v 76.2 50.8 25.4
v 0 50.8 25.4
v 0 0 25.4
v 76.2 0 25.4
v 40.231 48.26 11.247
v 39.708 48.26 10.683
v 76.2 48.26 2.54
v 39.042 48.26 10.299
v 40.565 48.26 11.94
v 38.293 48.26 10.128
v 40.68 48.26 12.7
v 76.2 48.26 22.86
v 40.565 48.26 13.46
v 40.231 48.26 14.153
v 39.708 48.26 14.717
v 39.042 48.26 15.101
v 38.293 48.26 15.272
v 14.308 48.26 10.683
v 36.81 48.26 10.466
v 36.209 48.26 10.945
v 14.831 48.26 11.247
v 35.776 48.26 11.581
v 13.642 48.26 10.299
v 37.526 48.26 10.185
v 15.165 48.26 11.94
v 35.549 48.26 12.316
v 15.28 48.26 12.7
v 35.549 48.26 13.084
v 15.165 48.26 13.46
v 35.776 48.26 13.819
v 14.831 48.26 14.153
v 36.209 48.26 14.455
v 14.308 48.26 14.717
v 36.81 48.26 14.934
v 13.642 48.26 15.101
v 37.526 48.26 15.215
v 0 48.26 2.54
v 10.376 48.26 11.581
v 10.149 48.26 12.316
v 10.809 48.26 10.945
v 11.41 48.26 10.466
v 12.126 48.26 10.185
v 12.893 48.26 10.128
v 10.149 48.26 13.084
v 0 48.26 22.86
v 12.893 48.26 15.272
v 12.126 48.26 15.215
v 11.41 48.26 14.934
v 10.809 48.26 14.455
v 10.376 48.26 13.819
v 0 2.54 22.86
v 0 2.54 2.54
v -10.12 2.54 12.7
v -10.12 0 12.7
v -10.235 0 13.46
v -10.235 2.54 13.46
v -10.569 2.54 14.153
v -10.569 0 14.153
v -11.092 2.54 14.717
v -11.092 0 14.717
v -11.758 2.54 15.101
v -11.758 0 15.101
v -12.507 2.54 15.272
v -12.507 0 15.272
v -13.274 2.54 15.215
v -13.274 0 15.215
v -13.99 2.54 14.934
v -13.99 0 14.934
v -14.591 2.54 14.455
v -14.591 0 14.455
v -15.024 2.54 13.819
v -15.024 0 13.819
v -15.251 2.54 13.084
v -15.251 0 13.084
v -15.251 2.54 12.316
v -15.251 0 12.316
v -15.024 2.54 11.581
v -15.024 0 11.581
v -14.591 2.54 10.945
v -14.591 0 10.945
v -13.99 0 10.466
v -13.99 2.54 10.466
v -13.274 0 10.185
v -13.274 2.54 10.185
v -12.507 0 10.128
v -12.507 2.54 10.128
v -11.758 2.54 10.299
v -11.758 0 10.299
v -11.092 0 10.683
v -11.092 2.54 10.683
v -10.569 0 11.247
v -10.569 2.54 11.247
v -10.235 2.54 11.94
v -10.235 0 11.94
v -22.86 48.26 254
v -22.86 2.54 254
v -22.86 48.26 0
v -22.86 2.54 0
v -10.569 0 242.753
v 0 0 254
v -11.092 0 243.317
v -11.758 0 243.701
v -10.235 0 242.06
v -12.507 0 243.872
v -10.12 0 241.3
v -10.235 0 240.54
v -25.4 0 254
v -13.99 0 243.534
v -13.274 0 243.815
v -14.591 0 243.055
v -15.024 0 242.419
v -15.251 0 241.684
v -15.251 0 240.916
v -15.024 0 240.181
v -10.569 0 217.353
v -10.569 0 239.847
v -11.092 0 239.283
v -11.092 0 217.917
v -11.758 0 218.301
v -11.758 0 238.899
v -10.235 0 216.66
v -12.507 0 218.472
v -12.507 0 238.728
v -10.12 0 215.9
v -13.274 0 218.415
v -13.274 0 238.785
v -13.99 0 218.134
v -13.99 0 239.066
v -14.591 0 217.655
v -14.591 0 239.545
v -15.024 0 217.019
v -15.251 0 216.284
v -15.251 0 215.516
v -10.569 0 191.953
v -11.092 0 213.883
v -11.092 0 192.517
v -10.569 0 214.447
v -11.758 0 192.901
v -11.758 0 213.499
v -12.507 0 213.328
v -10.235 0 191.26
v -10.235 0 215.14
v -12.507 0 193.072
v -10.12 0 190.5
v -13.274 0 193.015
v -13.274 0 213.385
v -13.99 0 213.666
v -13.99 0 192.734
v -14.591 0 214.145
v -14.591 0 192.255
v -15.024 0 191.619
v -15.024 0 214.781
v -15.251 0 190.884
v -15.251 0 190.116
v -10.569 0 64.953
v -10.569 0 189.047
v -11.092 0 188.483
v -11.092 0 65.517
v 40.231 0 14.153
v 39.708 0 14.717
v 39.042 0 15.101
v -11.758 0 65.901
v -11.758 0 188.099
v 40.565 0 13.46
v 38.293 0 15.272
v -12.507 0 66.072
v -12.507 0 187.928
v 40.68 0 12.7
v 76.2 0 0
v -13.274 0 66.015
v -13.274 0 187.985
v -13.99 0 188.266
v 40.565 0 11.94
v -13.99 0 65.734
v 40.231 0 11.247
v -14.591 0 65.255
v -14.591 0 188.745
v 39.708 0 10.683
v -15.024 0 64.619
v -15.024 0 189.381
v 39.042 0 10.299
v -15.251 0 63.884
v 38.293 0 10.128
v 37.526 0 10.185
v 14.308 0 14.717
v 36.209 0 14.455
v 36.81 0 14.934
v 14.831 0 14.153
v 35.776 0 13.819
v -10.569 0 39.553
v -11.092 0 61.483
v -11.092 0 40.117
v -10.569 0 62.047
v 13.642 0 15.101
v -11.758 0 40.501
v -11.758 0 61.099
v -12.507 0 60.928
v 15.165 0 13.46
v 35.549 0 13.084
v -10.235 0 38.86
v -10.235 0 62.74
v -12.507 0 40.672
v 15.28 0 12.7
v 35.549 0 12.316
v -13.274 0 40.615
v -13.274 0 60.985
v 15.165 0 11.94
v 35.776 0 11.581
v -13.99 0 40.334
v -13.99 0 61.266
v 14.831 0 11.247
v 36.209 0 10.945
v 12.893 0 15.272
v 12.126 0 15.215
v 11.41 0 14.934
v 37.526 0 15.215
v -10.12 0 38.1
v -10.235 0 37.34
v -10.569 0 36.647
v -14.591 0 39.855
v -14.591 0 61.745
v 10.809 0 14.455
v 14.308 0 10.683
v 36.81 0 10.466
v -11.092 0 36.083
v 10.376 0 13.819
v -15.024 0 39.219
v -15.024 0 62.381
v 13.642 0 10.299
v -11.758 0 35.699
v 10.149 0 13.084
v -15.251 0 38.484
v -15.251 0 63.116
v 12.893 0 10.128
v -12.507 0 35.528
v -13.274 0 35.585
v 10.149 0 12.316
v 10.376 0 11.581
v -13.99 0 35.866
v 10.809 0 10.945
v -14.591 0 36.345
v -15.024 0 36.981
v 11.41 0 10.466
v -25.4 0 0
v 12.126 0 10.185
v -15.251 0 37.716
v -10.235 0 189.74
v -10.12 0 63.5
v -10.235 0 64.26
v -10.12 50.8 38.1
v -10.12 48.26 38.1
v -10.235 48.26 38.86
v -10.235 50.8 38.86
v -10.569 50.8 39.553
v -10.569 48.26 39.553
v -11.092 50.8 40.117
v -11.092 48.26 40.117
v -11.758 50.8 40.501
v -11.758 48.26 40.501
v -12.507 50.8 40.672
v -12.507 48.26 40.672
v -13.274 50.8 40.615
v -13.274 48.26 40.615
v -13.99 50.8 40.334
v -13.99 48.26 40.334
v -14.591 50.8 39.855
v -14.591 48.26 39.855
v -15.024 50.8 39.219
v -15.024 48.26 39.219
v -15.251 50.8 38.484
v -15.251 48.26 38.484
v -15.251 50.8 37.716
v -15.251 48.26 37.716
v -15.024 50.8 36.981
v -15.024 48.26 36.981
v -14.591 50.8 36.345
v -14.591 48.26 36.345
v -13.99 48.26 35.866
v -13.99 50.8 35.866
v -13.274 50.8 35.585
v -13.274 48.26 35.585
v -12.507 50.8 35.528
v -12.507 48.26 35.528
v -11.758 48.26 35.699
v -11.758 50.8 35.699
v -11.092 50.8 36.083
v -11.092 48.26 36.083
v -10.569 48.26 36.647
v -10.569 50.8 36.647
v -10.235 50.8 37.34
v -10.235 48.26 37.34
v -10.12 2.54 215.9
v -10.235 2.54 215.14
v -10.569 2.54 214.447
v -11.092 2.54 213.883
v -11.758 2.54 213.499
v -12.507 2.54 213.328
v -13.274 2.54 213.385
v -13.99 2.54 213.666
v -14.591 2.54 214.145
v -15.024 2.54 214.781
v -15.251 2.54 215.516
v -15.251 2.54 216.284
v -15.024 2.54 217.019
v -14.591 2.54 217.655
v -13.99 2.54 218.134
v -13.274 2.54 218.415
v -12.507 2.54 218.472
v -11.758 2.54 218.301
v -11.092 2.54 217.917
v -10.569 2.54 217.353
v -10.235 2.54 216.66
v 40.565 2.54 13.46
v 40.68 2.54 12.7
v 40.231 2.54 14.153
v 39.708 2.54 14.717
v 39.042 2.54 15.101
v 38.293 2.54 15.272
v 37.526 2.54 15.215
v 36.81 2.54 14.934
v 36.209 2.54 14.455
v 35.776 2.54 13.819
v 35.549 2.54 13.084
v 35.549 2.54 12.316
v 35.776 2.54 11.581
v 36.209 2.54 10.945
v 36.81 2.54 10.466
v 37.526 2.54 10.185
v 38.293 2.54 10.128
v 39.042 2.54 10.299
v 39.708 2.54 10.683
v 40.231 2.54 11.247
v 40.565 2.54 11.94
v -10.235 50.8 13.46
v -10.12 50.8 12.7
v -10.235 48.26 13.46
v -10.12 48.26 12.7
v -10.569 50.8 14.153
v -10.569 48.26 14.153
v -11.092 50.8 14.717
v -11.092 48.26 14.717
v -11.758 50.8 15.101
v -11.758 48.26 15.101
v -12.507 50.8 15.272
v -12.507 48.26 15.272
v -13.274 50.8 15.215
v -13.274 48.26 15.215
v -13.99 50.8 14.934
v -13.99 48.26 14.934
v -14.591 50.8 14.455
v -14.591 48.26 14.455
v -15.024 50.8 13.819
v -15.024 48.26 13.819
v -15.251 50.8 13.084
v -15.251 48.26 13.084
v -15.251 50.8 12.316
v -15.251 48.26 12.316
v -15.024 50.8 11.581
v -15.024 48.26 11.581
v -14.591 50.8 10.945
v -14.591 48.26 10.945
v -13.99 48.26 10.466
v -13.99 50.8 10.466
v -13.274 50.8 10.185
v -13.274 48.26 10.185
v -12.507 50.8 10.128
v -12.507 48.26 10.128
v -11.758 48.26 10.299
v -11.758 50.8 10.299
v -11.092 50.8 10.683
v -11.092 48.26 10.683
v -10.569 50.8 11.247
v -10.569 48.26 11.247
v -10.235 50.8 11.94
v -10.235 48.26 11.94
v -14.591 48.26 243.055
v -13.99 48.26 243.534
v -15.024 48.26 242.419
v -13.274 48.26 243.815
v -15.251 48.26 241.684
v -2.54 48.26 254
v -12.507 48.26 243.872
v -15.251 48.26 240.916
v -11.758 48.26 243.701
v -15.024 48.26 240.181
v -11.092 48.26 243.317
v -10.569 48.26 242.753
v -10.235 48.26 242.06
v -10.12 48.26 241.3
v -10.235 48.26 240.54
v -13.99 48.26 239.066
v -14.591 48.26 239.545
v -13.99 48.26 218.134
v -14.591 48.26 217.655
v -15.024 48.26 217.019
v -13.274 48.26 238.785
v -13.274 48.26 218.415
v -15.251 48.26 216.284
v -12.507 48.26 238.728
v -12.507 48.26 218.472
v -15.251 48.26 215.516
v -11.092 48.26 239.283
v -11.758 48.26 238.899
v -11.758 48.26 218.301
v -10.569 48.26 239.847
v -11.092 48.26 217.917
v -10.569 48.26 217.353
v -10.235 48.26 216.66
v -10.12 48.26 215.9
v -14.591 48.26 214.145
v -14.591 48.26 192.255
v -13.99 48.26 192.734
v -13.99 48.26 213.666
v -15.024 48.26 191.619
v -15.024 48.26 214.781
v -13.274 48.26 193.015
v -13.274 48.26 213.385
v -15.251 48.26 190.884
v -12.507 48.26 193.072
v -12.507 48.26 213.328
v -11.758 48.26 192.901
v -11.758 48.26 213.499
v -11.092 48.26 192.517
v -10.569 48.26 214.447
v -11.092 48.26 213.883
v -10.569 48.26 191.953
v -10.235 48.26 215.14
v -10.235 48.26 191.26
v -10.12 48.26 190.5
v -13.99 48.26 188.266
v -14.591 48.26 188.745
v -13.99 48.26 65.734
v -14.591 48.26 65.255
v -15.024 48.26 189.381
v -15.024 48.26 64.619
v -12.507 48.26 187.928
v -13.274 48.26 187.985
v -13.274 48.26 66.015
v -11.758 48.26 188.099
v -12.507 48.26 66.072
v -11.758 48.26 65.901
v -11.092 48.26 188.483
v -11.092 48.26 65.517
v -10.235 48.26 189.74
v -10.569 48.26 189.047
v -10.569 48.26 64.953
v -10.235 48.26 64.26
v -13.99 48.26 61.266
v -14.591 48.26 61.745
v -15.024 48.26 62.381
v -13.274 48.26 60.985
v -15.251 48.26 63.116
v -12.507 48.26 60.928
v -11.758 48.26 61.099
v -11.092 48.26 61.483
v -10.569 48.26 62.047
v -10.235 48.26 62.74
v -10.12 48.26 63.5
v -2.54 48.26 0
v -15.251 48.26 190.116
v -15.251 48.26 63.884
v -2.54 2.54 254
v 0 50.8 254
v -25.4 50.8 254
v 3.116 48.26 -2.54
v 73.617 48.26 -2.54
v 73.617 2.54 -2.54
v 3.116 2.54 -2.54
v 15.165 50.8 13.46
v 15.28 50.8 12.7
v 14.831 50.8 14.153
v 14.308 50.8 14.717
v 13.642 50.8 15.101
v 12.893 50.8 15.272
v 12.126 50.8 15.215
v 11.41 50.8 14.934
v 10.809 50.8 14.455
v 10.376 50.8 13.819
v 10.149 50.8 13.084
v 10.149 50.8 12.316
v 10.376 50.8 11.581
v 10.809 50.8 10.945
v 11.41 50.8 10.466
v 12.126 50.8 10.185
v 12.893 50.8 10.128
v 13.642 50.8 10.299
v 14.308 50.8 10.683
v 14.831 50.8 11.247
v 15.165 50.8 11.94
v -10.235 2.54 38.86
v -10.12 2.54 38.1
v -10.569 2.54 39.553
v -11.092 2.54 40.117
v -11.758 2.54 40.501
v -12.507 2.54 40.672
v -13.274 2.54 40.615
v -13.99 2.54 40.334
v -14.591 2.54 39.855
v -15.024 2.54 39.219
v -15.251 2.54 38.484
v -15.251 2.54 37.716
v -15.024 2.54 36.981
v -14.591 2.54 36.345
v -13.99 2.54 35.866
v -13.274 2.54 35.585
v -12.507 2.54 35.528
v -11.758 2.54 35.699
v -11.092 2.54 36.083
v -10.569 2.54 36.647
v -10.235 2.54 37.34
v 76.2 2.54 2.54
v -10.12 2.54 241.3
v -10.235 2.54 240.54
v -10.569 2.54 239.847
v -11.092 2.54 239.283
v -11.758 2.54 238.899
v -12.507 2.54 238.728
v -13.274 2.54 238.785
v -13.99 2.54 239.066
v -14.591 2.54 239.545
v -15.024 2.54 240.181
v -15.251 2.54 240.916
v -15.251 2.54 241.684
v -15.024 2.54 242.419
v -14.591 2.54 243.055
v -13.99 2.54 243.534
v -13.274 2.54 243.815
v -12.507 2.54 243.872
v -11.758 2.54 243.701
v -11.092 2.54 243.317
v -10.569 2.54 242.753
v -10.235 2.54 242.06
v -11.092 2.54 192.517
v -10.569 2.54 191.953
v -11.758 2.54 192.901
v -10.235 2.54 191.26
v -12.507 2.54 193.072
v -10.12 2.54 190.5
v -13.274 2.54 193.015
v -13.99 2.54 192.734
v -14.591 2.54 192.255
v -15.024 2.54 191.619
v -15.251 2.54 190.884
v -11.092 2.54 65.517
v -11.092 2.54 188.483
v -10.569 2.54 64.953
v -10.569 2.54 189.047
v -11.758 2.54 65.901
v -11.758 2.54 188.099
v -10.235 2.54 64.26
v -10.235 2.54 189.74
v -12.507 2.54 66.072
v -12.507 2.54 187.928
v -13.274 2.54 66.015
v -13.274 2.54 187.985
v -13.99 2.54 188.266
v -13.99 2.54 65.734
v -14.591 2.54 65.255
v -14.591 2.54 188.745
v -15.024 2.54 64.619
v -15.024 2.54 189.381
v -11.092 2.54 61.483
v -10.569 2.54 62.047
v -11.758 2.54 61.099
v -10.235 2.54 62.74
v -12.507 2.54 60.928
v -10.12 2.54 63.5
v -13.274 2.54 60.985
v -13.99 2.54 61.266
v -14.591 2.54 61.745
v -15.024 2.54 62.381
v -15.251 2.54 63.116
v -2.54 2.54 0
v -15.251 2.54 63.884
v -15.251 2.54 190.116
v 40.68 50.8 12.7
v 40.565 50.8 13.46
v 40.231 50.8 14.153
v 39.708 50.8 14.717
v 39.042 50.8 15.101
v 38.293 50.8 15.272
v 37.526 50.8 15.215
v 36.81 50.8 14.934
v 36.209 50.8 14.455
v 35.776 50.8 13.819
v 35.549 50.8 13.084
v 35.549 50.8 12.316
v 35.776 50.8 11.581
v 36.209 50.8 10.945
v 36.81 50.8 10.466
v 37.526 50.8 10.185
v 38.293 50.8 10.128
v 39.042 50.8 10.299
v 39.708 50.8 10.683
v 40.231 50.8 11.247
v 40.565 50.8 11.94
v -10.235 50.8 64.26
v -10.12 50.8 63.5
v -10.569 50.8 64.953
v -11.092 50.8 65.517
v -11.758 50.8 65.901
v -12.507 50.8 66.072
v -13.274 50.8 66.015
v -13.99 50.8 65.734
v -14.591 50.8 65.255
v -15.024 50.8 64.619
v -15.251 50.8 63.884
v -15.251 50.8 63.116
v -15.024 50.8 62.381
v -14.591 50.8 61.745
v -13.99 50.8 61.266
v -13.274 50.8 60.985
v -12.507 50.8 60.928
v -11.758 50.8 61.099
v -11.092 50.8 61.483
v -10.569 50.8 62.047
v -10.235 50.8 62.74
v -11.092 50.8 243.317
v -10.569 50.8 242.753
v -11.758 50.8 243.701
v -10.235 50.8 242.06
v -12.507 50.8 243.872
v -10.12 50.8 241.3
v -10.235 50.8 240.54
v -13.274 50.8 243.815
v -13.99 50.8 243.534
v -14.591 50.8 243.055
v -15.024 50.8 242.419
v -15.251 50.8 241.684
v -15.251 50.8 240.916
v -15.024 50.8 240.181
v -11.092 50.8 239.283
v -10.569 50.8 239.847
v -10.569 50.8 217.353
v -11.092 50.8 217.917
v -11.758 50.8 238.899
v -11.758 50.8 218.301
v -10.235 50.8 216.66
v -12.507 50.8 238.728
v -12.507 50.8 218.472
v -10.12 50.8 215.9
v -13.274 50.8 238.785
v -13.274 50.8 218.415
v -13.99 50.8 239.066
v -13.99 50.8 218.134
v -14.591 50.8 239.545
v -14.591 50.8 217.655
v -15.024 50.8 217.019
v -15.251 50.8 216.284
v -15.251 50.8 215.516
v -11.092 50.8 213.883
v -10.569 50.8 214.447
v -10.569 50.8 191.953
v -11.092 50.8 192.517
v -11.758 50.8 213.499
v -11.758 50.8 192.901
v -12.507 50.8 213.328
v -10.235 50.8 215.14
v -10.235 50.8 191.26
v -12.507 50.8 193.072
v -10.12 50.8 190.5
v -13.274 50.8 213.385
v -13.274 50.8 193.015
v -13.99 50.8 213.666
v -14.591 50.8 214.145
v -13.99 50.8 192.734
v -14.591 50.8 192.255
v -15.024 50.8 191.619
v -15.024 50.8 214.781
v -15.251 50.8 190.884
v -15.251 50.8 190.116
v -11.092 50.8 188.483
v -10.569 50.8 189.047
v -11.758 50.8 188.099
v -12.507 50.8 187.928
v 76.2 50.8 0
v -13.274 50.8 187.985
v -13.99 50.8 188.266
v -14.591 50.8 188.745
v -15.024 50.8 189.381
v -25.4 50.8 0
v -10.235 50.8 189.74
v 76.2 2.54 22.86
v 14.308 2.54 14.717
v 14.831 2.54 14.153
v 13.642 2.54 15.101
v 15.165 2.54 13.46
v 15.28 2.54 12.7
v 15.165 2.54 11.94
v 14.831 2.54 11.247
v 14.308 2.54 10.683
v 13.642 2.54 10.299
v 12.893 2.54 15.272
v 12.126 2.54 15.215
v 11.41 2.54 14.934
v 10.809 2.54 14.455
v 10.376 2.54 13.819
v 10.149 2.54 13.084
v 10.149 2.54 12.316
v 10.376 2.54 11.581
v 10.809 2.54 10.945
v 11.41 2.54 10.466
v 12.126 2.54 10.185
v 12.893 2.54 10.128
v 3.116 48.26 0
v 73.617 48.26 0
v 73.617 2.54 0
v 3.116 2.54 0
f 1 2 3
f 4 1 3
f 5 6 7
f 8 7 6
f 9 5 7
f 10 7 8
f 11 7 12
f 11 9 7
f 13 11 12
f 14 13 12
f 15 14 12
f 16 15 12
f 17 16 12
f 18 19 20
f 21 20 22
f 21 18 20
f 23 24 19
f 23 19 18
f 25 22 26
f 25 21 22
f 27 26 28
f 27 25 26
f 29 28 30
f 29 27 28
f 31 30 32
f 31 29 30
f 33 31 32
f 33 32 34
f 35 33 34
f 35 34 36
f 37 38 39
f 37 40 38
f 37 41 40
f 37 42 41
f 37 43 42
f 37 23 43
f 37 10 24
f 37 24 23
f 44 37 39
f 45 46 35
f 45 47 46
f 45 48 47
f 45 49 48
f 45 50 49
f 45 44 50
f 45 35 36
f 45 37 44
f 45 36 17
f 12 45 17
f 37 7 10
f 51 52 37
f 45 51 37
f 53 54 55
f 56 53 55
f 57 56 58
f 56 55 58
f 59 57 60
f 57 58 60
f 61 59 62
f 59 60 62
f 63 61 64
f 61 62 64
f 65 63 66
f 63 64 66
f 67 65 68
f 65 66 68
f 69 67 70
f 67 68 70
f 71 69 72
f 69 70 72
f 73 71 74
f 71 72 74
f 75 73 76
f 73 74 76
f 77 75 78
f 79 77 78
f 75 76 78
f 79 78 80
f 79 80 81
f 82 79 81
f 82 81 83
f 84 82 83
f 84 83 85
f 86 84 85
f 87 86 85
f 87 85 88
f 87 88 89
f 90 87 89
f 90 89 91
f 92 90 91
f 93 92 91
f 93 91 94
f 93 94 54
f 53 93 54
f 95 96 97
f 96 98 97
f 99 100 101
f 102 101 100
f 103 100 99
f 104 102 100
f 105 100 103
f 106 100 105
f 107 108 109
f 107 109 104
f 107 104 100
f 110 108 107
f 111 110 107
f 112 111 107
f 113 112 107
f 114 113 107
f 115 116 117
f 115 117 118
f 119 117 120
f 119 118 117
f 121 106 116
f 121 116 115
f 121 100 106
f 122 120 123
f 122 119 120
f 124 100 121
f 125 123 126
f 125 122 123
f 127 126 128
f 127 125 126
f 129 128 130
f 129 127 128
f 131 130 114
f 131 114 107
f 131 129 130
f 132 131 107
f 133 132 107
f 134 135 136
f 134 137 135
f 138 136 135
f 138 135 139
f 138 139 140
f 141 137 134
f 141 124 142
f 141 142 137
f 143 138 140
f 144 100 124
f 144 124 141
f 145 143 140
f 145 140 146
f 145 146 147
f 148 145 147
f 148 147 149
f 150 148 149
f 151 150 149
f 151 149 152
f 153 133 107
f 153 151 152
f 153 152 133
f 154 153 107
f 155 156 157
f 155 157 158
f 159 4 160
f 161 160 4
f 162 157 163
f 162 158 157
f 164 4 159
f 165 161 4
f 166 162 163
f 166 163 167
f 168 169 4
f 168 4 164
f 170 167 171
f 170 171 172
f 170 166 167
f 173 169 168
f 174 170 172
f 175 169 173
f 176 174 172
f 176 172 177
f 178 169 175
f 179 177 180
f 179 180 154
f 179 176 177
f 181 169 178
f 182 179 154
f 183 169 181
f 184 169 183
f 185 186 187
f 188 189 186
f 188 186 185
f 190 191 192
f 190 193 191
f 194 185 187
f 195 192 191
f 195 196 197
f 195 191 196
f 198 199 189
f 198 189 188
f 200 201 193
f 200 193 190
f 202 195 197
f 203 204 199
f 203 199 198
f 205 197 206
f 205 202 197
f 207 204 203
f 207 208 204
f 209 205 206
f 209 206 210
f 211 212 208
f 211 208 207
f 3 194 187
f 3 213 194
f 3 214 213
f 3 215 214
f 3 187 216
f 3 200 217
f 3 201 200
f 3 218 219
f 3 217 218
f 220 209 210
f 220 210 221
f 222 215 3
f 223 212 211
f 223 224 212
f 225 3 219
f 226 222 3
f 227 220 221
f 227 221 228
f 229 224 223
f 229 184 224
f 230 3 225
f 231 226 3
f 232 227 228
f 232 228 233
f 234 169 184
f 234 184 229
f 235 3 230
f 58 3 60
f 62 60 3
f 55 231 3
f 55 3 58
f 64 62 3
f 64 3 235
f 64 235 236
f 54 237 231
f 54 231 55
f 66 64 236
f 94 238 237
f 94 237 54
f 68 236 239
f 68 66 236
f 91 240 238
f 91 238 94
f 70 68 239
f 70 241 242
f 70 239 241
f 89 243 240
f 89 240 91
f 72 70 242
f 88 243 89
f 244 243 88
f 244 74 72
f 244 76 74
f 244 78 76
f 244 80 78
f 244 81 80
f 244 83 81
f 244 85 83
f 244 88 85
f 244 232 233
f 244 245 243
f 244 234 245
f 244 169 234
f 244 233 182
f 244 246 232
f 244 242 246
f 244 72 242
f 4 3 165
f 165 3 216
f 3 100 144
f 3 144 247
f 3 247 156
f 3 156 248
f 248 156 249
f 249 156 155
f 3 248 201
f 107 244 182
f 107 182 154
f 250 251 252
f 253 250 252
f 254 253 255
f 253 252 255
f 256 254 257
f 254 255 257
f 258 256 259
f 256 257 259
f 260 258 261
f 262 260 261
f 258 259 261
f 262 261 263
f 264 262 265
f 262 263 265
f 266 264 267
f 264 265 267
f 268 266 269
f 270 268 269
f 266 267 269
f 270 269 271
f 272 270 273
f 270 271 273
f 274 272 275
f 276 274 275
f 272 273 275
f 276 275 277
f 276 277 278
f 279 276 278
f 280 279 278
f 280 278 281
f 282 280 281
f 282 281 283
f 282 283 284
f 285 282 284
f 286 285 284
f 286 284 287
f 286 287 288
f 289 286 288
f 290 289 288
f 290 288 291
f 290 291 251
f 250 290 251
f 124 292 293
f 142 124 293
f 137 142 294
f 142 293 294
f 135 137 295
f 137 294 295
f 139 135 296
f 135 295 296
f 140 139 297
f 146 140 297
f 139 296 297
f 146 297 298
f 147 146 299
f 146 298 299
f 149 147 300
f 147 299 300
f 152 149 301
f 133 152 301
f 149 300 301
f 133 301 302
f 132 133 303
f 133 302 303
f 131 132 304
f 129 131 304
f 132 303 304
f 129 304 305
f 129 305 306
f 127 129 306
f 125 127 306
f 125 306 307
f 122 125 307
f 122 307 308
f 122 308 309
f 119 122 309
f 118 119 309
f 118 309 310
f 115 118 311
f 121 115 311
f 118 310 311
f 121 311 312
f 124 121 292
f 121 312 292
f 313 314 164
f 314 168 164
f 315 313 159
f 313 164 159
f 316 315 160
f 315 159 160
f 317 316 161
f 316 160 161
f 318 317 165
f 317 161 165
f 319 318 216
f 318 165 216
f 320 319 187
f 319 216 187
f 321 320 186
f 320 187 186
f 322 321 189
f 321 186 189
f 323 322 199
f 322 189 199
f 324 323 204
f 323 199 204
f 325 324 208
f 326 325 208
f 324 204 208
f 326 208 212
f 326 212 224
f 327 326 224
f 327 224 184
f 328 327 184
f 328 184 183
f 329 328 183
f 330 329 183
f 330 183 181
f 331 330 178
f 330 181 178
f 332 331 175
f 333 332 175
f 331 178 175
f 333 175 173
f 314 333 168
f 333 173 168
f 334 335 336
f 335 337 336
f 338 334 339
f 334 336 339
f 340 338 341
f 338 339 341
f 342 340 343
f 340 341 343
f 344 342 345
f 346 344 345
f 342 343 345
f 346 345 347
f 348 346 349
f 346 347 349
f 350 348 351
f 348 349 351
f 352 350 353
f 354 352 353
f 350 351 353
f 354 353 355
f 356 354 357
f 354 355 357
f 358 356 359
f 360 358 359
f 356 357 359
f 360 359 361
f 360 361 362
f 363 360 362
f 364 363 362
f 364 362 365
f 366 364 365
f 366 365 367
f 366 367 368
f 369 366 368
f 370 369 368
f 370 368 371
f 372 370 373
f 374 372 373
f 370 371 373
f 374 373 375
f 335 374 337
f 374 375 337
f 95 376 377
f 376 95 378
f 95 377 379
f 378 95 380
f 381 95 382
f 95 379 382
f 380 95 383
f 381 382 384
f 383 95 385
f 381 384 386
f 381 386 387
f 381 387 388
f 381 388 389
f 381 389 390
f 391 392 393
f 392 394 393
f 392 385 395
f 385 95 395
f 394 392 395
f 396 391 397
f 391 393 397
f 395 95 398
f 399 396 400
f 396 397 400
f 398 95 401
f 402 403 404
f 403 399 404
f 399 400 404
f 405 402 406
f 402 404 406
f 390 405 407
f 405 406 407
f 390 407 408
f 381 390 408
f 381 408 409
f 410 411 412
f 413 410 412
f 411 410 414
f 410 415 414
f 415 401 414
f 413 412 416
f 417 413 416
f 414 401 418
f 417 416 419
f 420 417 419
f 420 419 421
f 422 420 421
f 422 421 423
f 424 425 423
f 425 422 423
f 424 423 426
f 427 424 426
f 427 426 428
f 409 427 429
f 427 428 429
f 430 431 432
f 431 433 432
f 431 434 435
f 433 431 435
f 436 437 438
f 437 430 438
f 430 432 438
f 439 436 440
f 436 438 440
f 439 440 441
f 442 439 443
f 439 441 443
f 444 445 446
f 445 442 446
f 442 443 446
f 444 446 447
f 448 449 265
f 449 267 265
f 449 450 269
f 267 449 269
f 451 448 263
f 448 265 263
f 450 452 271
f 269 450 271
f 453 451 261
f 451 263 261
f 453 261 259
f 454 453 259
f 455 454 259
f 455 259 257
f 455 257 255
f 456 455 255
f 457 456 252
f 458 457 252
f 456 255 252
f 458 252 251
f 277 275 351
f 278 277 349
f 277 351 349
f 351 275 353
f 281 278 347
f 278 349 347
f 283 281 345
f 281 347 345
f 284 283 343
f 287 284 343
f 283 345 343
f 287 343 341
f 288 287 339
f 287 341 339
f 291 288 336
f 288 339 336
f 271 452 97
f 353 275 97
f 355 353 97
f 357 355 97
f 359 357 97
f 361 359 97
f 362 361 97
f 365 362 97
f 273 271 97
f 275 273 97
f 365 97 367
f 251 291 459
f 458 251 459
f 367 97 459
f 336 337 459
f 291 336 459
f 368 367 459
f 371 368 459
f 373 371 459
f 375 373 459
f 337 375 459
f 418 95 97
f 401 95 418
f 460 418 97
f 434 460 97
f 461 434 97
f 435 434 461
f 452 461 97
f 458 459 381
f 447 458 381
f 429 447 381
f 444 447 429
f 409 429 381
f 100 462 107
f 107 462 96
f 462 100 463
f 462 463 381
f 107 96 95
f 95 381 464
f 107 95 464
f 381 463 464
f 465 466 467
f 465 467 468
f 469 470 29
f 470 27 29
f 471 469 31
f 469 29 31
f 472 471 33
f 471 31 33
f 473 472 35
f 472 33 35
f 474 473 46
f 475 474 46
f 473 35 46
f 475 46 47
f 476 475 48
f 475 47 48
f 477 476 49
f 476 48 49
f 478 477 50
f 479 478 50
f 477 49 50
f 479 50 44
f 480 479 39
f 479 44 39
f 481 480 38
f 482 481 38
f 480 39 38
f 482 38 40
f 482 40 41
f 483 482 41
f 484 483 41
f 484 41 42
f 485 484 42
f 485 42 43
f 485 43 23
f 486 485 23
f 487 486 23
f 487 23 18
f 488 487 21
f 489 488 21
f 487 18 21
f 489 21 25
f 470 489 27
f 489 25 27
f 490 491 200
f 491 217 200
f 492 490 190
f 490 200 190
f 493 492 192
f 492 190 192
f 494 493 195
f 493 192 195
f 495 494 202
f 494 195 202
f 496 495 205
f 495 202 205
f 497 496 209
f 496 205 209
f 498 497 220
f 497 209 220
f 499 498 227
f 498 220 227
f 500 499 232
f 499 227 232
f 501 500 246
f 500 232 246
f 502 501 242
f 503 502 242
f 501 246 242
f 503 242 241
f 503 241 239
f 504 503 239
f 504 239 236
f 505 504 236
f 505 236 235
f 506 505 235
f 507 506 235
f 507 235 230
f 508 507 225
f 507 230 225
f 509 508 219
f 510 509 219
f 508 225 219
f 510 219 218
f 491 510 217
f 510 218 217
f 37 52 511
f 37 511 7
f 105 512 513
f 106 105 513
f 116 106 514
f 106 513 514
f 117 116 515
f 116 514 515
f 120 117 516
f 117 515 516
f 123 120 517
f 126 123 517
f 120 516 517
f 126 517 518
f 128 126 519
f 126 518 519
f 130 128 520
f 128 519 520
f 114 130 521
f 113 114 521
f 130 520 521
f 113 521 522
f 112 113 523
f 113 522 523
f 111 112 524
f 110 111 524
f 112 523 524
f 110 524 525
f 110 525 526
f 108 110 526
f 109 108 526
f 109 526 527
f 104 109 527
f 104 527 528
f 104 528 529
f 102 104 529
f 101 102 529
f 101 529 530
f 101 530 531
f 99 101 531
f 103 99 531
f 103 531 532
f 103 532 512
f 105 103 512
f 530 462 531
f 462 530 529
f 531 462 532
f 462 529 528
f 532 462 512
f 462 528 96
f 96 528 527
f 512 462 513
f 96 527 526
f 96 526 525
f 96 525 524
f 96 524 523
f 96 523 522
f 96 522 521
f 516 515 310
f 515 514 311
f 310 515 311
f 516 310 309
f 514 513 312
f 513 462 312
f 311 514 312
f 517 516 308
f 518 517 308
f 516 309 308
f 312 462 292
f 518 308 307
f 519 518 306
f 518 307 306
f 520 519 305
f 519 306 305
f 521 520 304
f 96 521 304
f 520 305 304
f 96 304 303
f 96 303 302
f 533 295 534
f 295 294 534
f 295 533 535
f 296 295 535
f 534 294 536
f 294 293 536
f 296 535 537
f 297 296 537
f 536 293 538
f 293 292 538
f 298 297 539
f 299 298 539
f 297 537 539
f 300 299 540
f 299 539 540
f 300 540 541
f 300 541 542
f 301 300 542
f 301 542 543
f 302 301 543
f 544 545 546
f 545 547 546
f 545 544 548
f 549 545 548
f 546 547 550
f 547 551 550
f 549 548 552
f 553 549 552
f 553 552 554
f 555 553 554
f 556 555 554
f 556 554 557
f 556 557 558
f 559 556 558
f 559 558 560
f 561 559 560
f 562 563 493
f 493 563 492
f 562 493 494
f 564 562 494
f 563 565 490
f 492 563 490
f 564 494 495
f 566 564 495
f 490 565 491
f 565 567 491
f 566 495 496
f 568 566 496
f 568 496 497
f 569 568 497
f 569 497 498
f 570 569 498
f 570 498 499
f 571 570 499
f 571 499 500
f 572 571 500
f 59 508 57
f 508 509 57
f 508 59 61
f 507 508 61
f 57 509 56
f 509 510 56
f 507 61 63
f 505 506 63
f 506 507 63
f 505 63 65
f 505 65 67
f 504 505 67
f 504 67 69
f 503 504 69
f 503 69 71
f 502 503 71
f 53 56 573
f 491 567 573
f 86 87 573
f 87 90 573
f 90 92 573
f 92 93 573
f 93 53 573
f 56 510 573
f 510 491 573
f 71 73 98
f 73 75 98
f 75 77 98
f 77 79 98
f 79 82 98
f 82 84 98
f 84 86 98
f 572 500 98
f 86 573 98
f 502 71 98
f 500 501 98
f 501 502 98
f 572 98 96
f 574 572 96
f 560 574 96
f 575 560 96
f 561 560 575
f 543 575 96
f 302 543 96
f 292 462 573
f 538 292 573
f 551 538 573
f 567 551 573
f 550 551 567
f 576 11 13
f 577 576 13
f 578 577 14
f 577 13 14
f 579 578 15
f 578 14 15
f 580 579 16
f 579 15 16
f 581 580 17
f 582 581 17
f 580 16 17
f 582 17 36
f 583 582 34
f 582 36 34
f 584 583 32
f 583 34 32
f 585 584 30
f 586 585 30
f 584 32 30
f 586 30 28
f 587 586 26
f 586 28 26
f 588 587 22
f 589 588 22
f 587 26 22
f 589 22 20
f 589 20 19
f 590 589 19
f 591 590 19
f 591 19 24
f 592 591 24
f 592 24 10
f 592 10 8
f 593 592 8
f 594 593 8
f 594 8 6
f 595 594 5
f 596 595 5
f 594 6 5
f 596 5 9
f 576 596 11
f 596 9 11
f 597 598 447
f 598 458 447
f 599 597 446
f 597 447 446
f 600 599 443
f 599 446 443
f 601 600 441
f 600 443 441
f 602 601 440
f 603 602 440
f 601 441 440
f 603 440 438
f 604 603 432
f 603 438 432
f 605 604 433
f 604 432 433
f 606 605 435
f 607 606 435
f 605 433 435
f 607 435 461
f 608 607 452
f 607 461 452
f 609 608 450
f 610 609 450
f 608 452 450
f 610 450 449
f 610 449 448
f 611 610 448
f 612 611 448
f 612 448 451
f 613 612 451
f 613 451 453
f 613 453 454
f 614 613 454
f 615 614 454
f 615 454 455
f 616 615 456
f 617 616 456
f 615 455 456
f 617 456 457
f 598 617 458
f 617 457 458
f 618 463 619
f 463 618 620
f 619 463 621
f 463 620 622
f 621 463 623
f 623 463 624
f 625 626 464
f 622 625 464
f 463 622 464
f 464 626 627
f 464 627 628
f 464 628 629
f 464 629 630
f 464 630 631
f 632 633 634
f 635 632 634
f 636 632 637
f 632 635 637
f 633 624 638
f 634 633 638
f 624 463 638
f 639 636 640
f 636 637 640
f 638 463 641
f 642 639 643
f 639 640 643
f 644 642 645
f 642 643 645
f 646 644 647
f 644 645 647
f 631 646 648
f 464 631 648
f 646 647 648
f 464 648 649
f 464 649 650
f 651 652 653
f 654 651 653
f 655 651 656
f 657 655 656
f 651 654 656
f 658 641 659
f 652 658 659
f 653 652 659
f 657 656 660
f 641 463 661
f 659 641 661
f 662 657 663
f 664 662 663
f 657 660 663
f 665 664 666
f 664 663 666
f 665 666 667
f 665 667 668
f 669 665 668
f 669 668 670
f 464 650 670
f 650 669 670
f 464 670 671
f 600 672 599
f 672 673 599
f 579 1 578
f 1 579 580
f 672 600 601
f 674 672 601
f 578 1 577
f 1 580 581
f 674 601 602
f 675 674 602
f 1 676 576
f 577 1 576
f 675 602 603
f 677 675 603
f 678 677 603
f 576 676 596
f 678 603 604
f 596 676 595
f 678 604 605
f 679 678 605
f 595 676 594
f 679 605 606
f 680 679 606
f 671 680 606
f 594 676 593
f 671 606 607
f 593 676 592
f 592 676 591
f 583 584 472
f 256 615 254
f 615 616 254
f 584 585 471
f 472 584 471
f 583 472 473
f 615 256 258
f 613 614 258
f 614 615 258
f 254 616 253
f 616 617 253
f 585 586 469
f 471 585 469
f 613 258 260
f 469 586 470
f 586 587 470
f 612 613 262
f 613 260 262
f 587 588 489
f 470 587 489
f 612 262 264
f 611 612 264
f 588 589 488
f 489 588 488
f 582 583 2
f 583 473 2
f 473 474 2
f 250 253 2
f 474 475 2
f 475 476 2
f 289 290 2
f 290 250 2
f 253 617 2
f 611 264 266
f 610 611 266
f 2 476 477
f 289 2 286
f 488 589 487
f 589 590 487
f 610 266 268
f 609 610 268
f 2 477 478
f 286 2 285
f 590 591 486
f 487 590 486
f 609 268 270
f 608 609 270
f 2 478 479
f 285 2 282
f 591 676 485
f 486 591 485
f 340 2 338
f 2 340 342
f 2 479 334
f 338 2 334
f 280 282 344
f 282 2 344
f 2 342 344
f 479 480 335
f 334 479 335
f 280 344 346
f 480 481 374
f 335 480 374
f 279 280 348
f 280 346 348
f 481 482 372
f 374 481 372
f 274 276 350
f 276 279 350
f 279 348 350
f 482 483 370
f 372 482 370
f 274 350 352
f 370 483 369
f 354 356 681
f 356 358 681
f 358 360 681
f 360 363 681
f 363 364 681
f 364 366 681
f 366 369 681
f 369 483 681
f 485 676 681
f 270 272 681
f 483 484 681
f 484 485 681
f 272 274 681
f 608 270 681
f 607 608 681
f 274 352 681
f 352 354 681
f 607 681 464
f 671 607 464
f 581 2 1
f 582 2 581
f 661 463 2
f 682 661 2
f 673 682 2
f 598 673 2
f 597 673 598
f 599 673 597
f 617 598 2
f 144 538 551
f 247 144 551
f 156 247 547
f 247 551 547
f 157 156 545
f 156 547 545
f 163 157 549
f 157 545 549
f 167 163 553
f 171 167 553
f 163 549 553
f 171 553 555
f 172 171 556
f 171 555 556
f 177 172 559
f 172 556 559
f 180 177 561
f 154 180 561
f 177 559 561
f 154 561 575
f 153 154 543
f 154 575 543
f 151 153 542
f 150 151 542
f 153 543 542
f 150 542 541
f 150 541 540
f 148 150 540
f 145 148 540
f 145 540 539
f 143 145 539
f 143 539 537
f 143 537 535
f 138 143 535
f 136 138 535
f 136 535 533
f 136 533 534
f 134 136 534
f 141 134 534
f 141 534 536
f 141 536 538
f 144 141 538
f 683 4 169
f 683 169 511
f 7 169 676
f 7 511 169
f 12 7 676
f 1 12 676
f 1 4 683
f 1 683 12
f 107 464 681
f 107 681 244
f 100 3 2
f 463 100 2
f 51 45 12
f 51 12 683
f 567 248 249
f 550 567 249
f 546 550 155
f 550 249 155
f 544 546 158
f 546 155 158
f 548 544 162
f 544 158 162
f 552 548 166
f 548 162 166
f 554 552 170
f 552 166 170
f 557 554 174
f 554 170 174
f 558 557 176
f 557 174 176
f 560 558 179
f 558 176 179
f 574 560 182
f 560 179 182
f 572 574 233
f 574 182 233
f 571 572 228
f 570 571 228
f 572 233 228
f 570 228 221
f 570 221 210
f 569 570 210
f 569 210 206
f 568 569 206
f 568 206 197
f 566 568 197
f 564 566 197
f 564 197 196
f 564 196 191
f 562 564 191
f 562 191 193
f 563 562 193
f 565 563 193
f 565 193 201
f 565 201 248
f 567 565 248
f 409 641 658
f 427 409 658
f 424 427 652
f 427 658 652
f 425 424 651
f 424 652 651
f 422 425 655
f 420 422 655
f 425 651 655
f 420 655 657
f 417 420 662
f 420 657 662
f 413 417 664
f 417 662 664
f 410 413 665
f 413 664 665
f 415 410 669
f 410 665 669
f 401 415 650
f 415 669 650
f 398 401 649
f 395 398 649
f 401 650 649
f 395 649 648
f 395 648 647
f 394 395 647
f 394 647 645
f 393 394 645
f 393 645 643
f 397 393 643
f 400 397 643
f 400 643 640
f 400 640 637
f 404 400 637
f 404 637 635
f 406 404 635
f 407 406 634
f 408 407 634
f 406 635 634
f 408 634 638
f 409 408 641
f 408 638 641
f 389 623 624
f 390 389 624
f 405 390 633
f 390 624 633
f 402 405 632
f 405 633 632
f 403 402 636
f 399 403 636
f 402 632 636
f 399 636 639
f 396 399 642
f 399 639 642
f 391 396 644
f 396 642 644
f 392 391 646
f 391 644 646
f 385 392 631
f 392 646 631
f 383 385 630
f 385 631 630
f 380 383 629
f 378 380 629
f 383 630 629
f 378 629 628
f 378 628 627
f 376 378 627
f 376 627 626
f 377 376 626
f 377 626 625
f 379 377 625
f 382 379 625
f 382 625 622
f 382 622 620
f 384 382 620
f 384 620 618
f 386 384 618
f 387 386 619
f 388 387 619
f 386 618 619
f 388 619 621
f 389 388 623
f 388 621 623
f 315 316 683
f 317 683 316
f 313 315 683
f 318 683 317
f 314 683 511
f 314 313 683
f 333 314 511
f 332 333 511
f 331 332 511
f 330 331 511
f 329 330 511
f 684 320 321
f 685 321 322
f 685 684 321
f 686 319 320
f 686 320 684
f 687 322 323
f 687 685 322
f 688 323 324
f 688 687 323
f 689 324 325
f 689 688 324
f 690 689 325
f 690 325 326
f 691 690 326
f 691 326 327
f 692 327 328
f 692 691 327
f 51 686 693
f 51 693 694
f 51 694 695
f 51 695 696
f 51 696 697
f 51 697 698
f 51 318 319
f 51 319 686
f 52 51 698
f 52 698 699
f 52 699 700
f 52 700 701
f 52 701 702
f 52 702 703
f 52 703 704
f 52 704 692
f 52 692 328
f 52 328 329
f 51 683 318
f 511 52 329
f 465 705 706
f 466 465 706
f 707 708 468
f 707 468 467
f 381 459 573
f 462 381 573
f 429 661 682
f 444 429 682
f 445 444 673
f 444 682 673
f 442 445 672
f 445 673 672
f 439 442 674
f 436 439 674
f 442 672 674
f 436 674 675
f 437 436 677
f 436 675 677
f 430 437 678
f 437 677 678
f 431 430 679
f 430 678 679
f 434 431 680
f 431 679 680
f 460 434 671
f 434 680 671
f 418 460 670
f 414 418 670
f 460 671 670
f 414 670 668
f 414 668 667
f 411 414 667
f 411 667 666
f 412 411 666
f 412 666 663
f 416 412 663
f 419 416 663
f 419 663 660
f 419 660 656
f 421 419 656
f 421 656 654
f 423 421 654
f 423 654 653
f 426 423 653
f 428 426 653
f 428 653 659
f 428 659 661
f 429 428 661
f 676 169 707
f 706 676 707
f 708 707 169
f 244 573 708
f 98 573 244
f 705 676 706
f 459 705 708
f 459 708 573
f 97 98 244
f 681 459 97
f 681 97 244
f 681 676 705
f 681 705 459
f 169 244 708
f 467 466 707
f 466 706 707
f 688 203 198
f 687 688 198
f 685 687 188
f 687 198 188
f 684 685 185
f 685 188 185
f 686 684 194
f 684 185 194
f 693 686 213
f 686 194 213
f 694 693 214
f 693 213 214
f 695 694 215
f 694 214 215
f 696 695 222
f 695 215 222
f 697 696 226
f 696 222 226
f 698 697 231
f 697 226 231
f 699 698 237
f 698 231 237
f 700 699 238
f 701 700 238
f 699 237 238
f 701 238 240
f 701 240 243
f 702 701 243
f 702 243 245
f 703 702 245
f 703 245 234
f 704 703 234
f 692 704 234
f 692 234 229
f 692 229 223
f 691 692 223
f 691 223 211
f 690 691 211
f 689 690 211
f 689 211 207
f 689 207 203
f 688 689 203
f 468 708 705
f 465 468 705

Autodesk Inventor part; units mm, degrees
ref_plane "YZ Plane" through (0, 0, 0) normal (1, 0, 0) x (0, 1, 0)
ref_plane "XZ Plane" through (0, 0, 0) normal (0, 1, 0) x (-1, 0, 0)
ref_plane "XY Plane" through (0, 0, 0) normal (0, 0, 1) x (1, 0, 0)
sketch "Sketch15" plane through (0, 0, 0) normal (1, 0, 0) x (0, 1, 0)
  line L0 (0, 0) -> (50.8, 0)
  line L1 (50.8, 0) -> (50.8, 25.4)
  line L2 (50.8, 25.4) -> (0, 25.4)
  line L3 (0, 25.4) -> (0, 0)
  line L4 (48.26, 22.86) -> (2.54, 22.86)
  line L5 (2.54, 22.86) -> (2.54, 2.54)
  line L6 (2.54, 2.54) -> (48.26, 2.54)
  line L7 (48.26, 2.54) -> (48.26, 22.86)
  dimension "d46" = 25.4
  dimension "d47" = 50.8
  dimension "d48" = 2.54
  dimension "d49" = 2.54
  dimension "d50" = 2.54
  dimension "d51" = 2.54
extrude "Extrusion12" add sketch "Sketch15" along normal blind 76.2
sketch "Sketch17" plane through (0, 0, 0) normal (0, 0, -1) x (-1, 0, 0)
  line L0 (0, 2.54) -> (-76.2, 2.54) projected
  line L1 (0, 48.26) -> (-76.2, 48.26) projected
  line L2 (-73.617, 2.54) -> (-3.1161, 2.54)
  line L3 (-3.1161, 2.54) -> (-3.1161, 48.26)
  line L4 (-3.1161, 48.26) -> (-73.617, 48.26)
  line L5 (-73.617, 48.26) -> (-73.617, 2.54)
  point P0 (0, 0)
extrude "Extrusion14" add sketch "Sketch17" along normal blind 2.54
sketch "Sketch20" plane through (0, 0, 0) normal (0, 0, -1) x (-1, 0, 0)
  line L0 (0, 0) -> (25.4, 0)
  line L1 (25.4, 0) -> (0, 0)
  line L2 (0, 0) -> (0, 50.8)
  line L3 (0, 50.8) -> (25.4, 50.8)
  line L4 (25.4, 50.8) -> (25.4, 0)
  line L5 (22.86, 48.26) -> (2.54, 48.26)
  line L6 (2.54, 48.26) -> (2.54, 2.54)
  line L7 (2.54, 2.54) -> (22.86, 2.54)
  line L8 (22.86, 2.54) -> (22.86, 48.26)
  line L9 (0, 0) -> (0, 50.8) projected
  dimension "d71" = 25.4
  dimension "d72" = 50.8
  dimension "d73" = 2.54
  dimension "d74" = 2.54
  dimension "d75" = 2.54
  dimension "d76" = 2.54
  dimension "d78" = 0
extrude "Extrusion16" add sketch "Sketch20" against normal blind 254
sketch "Sketch21" plane through (76.2, 0, 0) normal (0, -1, 0) x (1, 0, 0)
  circle A0 centre (-38.1, 12.7) radius 2.5797
  circle A1 centre (-63.5, 12.7) radius 2.5797
  circle A2 centre (-88.9, 12.7) radius 2.5797
  circle A3 centre (-88.9, 38.1) radius 2.5797
  circle A4 centre (-88.9, 63.5) radius 2.5797
  line L0 (-76.2, 25.4) -> (0, 25.4) projected
  line L1 (-101.6, 0) -> (-101.6, 254) projected
  line L2 (-76.2, 25.4) -> (-76.2, 254) projected
  point P0 (-76.2, 0)
  dimension "d81" = 12.7
  dimension "d82" = 12.7
  dimension "d83" = 12.7
  dimension "d84" = 25.4
  dimension "d85" = 12.7
  dimension "d86" = 5.1594
  dimension "d87" = 5.1594
  dimension "d88" = 5.1594
  dimension "d89" = 25.4
  dimension "d90" = 25.4
  dimension "d91" = 25.4
  dimension "d92" = 5.1594
  dimension "d93" = 5.1594
  dimension "d94" = 12.7
  dimension "d95" = 12.7
extrude "Extrusion17" cut sketch "Sketch21" against normal blind 76.2
sketch "Sketch22" plane through (76.2, 50.8, 25.4) normal (0, 1, 0) x (1, 0, 0)
  circle A0 centre (-88.9, -215.9) radius 2.5797
  circle A1 centre (-88.9, -190.5) radius 2.5797
  circle A2 centre (-88.9, -165.1) radius 2.5797
  line L0 (-76.2, 0) -> (-76.2, -228.6) projected
  line L1 (-76.2, -228.6) -> (-101.6, -228.6) projected
  point P0 (-76.2, 25.4)
  dimension "d98" = 25.4
  dimension "d99" = 25.4
  dimension "d100" = 12.7
  dimension "d101" = 12.7
  dimension "d102" = 12.7
  dimension "d103" = 5.1594
  dimension "d104" = 5.1594
  dimension "d105" = 5.1594
  dimension "d108" = 12.7
extrude "Extrusion18" cut sketch "Sketch22" against normal blind 76.2
equation "\"d49\" = d48"
equation "\"d50\" = d48"
equation "\"d51\" = d48"
equation "\"d73\" = d77"
equation "\"d74\" = d77"
equation "\"d75\" = d77"
equation "\"d76\" = d77"
equation "\"d87\" = d86"
equation "\"d88\" = d86"
equation "\"d92\" = d86"
equation "\"d93\" = d86"
equation "\"d101\" = d100"
equation "\"d102\" = d100"
equation "\"d104\" = d103"
equation "\"d105\" = d103"
equation "\"d77\" = 2.54"
properties part number "left arm"
